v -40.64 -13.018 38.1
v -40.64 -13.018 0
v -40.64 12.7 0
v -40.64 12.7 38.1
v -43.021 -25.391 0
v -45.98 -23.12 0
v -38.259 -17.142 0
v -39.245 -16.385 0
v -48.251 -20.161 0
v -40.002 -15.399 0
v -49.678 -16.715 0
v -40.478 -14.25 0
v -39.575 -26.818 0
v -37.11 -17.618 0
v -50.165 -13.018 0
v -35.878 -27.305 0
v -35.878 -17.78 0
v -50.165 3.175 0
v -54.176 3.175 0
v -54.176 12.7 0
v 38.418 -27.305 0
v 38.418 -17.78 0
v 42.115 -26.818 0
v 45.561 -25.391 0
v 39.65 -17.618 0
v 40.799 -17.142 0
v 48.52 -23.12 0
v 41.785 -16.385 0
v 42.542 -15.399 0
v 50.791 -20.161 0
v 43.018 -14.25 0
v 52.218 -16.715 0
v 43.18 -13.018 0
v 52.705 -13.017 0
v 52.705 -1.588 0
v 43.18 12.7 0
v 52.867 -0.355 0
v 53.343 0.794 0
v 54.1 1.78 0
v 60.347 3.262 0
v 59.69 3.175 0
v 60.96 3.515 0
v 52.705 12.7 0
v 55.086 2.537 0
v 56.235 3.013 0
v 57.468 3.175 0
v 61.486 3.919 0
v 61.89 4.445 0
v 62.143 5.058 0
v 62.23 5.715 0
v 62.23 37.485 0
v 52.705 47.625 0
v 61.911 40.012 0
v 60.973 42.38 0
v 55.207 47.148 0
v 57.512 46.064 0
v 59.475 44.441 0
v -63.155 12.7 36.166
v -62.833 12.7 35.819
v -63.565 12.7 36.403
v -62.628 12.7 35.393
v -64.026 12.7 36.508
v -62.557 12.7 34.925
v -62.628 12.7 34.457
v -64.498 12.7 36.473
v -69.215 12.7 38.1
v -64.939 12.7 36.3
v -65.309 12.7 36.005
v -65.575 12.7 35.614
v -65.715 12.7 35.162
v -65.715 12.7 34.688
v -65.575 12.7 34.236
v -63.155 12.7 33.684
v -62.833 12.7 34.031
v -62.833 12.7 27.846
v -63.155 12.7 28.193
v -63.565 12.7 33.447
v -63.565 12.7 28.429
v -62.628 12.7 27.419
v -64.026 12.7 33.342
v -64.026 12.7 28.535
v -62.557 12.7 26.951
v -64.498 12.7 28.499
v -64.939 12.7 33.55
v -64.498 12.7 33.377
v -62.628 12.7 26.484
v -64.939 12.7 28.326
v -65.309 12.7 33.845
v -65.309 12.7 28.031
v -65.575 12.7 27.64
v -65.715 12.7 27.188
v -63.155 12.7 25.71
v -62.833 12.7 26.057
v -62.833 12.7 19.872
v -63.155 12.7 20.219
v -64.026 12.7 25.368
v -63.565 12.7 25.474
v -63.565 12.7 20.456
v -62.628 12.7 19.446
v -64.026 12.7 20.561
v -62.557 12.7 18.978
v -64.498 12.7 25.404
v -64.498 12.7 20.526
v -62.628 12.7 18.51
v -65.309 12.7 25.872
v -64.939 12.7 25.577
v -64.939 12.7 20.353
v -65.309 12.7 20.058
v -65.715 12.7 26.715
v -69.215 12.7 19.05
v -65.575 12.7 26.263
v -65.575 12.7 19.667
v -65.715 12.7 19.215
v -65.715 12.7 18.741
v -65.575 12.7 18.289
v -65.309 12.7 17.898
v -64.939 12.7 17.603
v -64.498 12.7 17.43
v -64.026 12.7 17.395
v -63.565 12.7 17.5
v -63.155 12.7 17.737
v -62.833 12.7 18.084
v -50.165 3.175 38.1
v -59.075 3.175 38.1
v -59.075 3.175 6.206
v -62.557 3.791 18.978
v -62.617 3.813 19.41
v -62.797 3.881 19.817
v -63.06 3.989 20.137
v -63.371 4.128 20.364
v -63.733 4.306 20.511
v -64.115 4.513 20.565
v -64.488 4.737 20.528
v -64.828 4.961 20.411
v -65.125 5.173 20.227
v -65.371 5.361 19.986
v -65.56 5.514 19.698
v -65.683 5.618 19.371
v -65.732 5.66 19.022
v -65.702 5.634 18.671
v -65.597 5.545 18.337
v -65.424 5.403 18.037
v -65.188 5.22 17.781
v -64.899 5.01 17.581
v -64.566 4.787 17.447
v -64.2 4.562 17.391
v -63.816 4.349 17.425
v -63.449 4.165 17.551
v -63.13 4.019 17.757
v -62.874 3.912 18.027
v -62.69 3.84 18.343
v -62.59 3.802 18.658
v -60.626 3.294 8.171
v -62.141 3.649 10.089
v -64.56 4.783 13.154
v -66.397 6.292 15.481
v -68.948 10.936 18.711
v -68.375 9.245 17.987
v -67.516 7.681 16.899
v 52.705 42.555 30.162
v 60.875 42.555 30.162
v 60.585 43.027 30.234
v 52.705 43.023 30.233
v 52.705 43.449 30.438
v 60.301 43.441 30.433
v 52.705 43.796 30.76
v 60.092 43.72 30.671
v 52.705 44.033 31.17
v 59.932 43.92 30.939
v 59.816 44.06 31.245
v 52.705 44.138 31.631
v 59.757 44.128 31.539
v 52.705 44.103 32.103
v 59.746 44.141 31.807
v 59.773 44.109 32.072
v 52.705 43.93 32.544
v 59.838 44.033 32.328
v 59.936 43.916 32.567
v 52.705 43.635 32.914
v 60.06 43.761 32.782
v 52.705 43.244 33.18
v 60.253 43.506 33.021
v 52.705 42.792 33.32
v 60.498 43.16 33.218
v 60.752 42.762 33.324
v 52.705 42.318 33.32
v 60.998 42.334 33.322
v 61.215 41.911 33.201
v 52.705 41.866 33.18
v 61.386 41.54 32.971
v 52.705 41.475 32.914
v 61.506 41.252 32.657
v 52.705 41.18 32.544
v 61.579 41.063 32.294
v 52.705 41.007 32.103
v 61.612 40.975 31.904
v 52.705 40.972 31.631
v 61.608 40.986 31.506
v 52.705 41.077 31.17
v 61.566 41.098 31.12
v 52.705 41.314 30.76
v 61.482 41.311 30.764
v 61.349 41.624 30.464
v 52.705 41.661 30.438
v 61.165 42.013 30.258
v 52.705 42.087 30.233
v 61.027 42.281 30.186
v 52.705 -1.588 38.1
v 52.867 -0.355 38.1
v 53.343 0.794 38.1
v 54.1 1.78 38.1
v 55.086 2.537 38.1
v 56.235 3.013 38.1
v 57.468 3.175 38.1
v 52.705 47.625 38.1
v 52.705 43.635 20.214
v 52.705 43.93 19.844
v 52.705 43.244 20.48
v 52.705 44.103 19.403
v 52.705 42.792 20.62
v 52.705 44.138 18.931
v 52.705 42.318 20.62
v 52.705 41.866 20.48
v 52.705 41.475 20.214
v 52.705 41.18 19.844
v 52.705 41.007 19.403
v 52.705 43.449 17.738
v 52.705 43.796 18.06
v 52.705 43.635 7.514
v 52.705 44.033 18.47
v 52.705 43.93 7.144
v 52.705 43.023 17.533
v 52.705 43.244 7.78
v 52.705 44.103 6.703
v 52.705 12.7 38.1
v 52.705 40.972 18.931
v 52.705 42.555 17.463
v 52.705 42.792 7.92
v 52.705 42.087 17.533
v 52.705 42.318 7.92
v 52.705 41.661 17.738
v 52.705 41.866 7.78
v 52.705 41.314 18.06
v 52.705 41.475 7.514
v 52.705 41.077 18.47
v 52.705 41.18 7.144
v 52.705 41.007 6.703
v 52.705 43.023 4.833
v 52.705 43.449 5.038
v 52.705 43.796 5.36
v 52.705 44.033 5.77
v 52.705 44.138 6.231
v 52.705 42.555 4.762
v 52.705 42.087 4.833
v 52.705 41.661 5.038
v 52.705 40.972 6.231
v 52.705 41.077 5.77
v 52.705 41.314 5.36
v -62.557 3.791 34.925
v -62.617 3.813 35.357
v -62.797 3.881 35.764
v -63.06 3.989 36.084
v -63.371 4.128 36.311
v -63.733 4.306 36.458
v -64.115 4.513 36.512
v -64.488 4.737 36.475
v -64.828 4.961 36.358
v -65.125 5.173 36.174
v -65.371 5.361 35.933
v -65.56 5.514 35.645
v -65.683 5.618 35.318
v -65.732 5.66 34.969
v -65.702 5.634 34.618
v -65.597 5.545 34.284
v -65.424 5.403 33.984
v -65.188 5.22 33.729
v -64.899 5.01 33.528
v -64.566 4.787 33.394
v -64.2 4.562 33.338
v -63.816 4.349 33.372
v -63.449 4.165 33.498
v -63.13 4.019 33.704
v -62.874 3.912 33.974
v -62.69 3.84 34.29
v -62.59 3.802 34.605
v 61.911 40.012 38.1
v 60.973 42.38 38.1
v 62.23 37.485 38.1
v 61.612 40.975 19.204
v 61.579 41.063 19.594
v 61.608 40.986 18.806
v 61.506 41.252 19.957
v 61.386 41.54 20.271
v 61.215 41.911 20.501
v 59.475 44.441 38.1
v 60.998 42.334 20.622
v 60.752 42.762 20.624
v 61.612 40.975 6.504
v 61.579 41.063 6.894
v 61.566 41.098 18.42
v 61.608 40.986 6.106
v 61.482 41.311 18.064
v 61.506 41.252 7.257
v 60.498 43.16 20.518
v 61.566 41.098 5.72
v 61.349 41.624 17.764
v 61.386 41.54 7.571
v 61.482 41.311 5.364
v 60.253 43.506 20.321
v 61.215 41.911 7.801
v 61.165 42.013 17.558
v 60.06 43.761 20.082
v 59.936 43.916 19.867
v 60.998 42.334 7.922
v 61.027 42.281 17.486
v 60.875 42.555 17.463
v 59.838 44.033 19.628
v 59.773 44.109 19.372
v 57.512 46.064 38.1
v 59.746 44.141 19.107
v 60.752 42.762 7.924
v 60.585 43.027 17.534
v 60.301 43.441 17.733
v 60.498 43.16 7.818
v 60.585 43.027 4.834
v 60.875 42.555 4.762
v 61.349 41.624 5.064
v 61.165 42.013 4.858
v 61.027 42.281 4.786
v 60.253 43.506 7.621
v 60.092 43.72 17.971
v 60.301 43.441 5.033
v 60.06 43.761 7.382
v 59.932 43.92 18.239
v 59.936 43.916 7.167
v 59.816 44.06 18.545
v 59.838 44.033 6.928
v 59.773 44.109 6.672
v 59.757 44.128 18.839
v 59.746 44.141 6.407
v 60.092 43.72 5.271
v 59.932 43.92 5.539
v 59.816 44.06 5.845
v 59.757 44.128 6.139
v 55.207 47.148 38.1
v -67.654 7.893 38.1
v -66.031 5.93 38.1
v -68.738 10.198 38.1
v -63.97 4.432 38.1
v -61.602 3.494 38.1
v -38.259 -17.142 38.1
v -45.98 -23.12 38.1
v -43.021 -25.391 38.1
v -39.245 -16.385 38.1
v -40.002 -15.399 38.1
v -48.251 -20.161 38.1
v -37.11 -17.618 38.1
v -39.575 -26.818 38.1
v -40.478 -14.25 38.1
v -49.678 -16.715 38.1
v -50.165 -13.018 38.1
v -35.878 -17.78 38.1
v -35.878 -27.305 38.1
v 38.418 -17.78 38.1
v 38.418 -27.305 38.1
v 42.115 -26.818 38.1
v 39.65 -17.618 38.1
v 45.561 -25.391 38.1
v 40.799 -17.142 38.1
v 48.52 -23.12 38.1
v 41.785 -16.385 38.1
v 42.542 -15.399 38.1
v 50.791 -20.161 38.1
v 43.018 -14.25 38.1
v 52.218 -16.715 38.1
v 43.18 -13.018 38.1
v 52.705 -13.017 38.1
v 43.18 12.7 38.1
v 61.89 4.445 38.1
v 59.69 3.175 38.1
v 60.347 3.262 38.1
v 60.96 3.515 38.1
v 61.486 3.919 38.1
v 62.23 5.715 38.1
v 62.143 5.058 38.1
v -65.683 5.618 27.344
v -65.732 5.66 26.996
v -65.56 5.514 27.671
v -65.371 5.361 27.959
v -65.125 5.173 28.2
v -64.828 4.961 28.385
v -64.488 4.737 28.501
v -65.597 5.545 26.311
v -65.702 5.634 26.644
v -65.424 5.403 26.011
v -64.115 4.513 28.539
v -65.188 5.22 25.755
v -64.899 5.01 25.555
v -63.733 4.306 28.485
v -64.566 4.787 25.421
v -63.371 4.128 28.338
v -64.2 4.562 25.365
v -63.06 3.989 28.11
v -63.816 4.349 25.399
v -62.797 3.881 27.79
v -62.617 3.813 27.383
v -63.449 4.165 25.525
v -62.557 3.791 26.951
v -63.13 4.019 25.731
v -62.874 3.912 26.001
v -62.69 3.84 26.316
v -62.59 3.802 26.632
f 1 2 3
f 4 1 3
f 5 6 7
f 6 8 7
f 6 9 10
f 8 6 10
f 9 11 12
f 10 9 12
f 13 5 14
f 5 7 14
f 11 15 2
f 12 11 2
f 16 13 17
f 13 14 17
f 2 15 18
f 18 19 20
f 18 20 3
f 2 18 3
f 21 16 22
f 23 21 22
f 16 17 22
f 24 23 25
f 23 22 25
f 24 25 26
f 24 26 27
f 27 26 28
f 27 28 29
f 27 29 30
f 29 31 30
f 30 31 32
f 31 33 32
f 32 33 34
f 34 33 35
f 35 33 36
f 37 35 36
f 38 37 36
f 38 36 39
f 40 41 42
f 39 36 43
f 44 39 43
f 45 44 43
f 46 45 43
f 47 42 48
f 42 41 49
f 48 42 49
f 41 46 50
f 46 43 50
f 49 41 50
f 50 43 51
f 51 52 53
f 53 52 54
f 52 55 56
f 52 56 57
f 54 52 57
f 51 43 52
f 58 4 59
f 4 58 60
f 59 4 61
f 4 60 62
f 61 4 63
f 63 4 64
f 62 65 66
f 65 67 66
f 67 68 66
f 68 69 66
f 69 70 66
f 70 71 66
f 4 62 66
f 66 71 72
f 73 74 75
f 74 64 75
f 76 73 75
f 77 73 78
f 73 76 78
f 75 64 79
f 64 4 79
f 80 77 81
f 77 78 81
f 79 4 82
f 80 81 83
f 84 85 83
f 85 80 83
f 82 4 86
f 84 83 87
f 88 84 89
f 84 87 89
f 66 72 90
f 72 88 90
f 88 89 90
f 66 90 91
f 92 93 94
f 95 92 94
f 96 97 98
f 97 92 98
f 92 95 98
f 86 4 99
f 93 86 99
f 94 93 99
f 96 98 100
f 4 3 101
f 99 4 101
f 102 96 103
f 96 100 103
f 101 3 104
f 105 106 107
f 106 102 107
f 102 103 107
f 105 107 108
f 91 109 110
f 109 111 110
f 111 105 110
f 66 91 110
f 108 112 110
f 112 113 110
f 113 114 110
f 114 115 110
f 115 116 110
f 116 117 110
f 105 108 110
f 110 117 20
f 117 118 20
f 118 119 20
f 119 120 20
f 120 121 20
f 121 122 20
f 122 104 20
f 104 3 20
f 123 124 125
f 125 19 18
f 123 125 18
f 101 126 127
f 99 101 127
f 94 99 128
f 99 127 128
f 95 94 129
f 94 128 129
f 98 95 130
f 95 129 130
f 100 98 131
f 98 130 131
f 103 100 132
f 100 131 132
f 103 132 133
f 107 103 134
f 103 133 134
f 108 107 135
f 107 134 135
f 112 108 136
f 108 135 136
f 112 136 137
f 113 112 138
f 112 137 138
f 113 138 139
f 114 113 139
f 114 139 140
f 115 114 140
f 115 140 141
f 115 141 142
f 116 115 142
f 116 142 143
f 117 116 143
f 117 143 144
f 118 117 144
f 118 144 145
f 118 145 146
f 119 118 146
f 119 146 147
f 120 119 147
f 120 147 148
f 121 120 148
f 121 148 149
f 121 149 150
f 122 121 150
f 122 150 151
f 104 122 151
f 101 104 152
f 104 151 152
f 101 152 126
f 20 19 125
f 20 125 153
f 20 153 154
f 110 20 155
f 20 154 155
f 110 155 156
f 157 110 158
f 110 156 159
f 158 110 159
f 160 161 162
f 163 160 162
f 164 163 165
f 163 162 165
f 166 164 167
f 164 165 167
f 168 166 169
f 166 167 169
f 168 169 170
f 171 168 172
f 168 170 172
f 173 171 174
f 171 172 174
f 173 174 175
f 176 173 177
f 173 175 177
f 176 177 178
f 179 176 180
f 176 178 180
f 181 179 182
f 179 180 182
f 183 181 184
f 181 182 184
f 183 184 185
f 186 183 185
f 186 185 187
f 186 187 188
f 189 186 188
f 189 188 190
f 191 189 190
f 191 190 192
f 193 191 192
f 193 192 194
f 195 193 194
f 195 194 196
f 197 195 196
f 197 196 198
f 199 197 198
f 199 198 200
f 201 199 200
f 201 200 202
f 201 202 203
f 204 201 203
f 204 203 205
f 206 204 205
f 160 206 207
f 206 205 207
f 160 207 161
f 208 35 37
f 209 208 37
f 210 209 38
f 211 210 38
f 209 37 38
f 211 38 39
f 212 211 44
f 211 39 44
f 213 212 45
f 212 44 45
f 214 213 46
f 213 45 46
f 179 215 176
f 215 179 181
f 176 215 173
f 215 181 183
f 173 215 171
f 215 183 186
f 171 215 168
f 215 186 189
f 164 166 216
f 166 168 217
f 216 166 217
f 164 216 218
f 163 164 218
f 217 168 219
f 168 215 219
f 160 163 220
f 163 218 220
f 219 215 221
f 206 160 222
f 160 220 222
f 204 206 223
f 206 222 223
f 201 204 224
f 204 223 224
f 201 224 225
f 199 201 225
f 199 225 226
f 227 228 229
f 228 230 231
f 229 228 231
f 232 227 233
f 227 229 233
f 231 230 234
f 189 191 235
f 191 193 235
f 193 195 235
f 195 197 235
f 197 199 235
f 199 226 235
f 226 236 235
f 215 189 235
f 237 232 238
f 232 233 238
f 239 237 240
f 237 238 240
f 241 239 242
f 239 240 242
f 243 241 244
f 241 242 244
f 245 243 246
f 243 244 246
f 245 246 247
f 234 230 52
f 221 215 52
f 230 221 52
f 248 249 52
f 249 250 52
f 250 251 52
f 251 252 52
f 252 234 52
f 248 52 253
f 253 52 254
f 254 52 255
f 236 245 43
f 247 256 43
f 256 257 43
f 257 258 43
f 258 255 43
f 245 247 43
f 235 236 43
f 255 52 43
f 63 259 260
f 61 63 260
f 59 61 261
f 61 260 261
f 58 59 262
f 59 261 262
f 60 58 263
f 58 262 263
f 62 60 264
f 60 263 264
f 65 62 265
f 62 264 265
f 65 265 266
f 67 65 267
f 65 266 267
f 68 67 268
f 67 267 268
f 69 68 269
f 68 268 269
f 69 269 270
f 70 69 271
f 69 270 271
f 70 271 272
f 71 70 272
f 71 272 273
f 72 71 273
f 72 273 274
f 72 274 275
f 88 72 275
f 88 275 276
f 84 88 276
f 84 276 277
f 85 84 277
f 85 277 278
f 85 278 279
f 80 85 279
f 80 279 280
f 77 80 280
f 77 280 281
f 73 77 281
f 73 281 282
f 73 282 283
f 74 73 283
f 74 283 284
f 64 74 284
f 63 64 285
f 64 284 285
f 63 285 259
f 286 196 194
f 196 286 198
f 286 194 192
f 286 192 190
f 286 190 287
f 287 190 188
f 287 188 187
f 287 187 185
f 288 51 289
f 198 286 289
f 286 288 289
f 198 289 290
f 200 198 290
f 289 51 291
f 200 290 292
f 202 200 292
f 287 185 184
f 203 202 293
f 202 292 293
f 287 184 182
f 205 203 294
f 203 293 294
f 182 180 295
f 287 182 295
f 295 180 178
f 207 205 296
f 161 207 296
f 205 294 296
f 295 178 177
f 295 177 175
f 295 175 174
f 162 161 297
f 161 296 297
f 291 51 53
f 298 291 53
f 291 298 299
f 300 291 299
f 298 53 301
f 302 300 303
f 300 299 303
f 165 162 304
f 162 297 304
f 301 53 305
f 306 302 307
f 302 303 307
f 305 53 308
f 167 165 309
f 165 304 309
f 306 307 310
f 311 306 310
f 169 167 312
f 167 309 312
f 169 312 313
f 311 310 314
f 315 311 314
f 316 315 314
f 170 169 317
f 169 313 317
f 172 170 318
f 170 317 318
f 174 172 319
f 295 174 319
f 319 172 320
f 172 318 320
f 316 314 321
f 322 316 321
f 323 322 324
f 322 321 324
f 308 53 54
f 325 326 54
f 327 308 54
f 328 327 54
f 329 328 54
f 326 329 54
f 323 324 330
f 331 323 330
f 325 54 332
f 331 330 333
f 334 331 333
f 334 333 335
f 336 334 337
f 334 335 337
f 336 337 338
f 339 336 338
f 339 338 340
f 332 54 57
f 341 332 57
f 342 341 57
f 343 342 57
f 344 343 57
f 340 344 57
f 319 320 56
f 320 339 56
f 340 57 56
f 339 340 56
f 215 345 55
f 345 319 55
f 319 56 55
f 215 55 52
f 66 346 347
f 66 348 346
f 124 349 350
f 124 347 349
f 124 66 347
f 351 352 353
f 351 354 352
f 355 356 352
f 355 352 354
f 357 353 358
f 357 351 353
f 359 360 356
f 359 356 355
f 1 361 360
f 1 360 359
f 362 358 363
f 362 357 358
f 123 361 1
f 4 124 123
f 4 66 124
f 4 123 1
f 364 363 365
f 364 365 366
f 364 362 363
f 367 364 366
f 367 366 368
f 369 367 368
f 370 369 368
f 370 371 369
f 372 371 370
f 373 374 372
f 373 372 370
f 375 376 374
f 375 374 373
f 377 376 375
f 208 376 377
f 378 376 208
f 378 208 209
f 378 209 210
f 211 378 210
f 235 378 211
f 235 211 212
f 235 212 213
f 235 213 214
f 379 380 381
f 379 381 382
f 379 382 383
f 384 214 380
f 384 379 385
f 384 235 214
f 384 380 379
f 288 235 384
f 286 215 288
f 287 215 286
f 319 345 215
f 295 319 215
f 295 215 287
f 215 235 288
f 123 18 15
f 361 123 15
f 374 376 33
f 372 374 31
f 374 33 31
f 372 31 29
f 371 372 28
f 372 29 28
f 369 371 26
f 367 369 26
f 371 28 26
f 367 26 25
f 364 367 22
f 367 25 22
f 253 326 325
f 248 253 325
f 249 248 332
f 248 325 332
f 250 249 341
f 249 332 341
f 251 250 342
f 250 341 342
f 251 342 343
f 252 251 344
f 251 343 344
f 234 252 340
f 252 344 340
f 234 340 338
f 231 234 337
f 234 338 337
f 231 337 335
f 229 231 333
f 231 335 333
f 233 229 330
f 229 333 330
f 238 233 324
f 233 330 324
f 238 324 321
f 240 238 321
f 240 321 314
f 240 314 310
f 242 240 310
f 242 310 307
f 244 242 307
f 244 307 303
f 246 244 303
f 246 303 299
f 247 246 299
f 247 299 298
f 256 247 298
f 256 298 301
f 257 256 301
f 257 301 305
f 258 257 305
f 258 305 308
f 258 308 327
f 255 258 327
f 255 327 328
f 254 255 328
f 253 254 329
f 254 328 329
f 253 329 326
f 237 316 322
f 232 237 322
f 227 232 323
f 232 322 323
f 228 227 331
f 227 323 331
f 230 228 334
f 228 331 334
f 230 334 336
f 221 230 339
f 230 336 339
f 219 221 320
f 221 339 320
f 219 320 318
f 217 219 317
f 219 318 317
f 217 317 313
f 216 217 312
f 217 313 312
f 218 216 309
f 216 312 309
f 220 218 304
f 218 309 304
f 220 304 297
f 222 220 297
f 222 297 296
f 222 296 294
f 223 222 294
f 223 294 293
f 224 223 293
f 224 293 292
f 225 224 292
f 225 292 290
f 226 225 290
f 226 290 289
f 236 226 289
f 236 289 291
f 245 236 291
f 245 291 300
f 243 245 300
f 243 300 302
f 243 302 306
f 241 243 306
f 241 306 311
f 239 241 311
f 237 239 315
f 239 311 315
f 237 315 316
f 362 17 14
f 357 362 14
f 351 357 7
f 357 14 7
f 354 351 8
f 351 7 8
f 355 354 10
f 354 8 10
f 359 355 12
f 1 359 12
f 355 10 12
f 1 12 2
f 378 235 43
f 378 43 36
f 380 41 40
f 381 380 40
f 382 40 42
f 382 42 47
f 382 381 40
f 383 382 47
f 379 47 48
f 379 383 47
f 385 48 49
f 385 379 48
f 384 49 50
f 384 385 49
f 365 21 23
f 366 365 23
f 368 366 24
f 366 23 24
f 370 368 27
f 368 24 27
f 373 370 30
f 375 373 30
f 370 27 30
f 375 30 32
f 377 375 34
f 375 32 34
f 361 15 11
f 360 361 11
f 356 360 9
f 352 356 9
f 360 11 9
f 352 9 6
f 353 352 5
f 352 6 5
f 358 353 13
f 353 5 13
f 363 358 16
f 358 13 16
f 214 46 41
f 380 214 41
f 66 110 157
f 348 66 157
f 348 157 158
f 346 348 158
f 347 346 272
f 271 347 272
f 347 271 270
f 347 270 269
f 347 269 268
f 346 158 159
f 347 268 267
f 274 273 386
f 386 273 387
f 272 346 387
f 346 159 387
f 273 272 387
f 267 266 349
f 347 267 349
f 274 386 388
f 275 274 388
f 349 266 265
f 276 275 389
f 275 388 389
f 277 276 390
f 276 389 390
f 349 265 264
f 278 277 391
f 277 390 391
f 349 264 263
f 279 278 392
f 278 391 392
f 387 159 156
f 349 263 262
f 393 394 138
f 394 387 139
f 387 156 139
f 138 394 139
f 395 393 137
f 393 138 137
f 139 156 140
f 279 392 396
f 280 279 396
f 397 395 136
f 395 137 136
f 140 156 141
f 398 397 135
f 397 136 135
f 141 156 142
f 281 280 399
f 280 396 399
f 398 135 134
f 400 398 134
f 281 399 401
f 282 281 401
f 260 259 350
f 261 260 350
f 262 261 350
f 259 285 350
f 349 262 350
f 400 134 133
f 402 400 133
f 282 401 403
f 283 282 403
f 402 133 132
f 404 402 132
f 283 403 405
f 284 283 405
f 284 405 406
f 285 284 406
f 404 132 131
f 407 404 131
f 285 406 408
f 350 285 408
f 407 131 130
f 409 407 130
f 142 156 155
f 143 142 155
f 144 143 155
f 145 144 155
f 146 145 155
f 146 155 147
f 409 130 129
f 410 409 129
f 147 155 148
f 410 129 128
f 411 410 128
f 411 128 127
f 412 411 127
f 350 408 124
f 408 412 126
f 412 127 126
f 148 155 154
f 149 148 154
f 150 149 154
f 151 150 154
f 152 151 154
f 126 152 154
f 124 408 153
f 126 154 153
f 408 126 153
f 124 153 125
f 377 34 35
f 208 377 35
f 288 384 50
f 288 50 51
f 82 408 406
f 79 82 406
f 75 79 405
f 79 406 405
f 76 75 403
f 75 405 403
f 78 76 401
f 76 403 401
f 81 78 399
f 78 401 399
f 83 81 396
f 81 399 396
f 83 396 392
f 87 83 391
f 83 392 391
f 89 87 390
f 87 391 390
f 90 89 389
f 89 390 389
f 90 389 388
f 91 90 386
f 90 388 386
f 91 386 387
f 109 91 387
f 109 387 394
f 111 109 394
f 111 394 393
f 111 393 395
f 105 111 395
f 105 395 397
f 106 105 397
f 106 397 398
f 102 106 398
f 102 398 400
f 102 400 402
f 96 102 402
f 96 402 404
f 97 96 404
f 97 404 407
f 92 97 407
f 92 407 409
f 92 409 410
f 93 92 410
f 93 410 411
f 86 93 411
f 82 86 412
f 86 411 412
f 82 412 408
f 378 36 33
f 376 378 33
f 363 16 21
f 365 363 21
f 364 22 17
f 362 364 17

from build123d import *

# Parameters (mm, degrees)
BOSS_EXTRUDE1_DEPTH = 38.1
FILLET1_R           = 2.54
FILLET2_R           = 10.16
CUT_EXTRUDE2_DEPTH  = 91.653895256
SKETCH3_R           = 1.5875
CUT_EXTRUDE3_DEPTH  = 145.905274749
SKETCH4_R           = 1.5875
CUT_EXTRUDE4_DEPTH  = 91.653895347


with BuildPart() as part:
    # Sketch1 → Boss-Extrude1 (new body)
    with BuildSketch(Plane.XY):
        with BuildLine():
            Line((-35.8775, -27.305), (38.4175, -27.305))
            ThreePointArc((38.4175, -27.305), (48.520288136, -23.120288136), (52.705, -13.0175))
            Line((52.705, -13.0175), (52.705, -1.5875))
            ThreePointArc((52.705, -1.5875), (54.099903955, 1.780096045), (57.4675, 3.175))
            Line((57.4675, 3.175), (62.23, 3.175))
            Line((62.23, 3.175), (62.23, 47.625))
            Line((62.23, 47.625), (52.705, 47.625))
            Line((52.705, 47.625), (52.705, 12.7))
            Line((52.705, 12.7), (43.18, 12.7))
            Line((43.18, 12.7), (43.18, -13.0175))
            ThreePointArc((43.18, -13.0175), (41.785096045, -16.385096045), (38.4175, -17.78))
            Line((38.4175, -17.78), (-35.8775, -17.78))
            ThreePointArc((-35.8775, -17.78), (-39.245096045, -16.385096045), (-40.64, -13.0175))
            Line((-40.64, -13.0175), (-40.64, 12.7))
            Line((-40.64, 12.7), (-50.165, 12.7))
            Line((-50.165, 12.7), (-59.69, 12.7))
            Line((-59.69, 12.7), (-69.215, 12.7))
            Line((-69.215, 12.7), (-69.215, 3.175))
            Line((-69.215, 3.175), (-50.165, 3.175))
            Line((-50.165, 3.175), (-50.165, -13.0175))
            ThreePointArc((-50.165, -13.0175), (-45.980288136, -23.120288136), (-35.8775, -27.305))
        make_face()
    extrude(amount=BOSS_EXTRUDE1_DEPTH)

    # Fillet1
    fillet1_edges = [part.edges().sort_by_distance(p)[0] for p in [
        (62.23, 3.175, 19.05),
    ]]
    fillet(fillet1_edges, radius=FILLET1_R)

    # Fillet2
    # the kernel refuses this fillet: 10.16 mm, written as the material it takes off along each edge
    with BuildSketch(Plane(origin=(-69.215, 3.175, -25.350342083), x_dir=(1, 0, 0), z_dir=(0, 0, 1))) as fillet2_piece_1:
        with BuildLine():
            CenterArc((10.140136833, 10.16), FILLET2_R, 183.583321698, 86.416678302)
            Line((0, 9.525), (-0.202802737, 9.5123))
            ThreePointArc((-0.202802737, 9.5123), (-0.2032, 4.7625), (-0.2032, 0))
            Line((-0.2032, 0), (0, -0.2032))
            Line((0, -0.2032), (10.140136833, -0.2032))
            Line((10.140136833, -0.2032), (10.140136833, 0))
        make_face()
    extrude(amount=88.800684167, mode=Mode.SUBTRACT)
    with BuildSketch(Plane(origin=(62.23, 47.625, -25.350342083), x_dir=(0, -1, 0), z_dir=(0, 0, 1))) as fillet2_piece_2:
        with BuildLine():
            CenterArc((10.140136833, -10.16), FILLET2_R, 90, 86.416678302)
            Line((0, -9.525), (-0.202802737, -9.5123))
            ThreePointArc((-0.202802737, -9.5123), (-0.2032, -4.7625), (-0.2032, 0))
            Line((-0.2032, 0), (0, 0.2032))
            Line((0, 0.2032), (10.140136833, 0.2032))
            Line((10.140136833, 0.2032), (10.140136833, 0))
        make_face()
    extrude(amount=88.800684167, mode=Mode.SUBTRACT)

    # Sketch2 → Cut-Extrude2 (cut, through all)
    with BuildSketch(Plane.XZ.offset(-3.175)):
        Polygon((-69.215, -5.08), (-50.165, -5.08), (-69.215, 19.05), align=None)
    extrude(amount=-CUT_EXTRUDE2_DEPTH, mode=Mode.SUBTRACT)

    # Sketch3 → Cut-Extrude3 (cut, through all)
    with BuildSketch(Plane(origin=(62.23, 0, 0), x_dir=(0, 0, -1), z_dir=(1, 0, 0))):
        with Locations((-6.35, 42.554931583)):
            Circle(SKETCH3_R)
        with Locations((-19.05, 42.554931583)):
            Circle(SKETCH3_R)
        with Locations((-31.75, 42.554931583)):
            Circle(SKETCH3_R)
    extrude(amount=-CUT_EXTRUDE3_DEPTH, mode=Mode.SUBTRACT)

    # Sketch4 → Cut-Extrude4 (cut, through all)
    with BuildSketch(Plane.XZ.offset(-3.175)):
        with Locations((-64.144931583, 34.925)):
            Circle(SKETCH4_R)
        with Locations((-64.144931583, 26.951456669)):
            Circle(SKETCH4_R)
        with Locations((-64.144931583, 18.977913339)):
            Circle(SKETCH4_R)
    extrude(amount=-CUT_EXTRUDE4_DEPTH, mode=Mode.SUBTRACT)


solid = part.part
